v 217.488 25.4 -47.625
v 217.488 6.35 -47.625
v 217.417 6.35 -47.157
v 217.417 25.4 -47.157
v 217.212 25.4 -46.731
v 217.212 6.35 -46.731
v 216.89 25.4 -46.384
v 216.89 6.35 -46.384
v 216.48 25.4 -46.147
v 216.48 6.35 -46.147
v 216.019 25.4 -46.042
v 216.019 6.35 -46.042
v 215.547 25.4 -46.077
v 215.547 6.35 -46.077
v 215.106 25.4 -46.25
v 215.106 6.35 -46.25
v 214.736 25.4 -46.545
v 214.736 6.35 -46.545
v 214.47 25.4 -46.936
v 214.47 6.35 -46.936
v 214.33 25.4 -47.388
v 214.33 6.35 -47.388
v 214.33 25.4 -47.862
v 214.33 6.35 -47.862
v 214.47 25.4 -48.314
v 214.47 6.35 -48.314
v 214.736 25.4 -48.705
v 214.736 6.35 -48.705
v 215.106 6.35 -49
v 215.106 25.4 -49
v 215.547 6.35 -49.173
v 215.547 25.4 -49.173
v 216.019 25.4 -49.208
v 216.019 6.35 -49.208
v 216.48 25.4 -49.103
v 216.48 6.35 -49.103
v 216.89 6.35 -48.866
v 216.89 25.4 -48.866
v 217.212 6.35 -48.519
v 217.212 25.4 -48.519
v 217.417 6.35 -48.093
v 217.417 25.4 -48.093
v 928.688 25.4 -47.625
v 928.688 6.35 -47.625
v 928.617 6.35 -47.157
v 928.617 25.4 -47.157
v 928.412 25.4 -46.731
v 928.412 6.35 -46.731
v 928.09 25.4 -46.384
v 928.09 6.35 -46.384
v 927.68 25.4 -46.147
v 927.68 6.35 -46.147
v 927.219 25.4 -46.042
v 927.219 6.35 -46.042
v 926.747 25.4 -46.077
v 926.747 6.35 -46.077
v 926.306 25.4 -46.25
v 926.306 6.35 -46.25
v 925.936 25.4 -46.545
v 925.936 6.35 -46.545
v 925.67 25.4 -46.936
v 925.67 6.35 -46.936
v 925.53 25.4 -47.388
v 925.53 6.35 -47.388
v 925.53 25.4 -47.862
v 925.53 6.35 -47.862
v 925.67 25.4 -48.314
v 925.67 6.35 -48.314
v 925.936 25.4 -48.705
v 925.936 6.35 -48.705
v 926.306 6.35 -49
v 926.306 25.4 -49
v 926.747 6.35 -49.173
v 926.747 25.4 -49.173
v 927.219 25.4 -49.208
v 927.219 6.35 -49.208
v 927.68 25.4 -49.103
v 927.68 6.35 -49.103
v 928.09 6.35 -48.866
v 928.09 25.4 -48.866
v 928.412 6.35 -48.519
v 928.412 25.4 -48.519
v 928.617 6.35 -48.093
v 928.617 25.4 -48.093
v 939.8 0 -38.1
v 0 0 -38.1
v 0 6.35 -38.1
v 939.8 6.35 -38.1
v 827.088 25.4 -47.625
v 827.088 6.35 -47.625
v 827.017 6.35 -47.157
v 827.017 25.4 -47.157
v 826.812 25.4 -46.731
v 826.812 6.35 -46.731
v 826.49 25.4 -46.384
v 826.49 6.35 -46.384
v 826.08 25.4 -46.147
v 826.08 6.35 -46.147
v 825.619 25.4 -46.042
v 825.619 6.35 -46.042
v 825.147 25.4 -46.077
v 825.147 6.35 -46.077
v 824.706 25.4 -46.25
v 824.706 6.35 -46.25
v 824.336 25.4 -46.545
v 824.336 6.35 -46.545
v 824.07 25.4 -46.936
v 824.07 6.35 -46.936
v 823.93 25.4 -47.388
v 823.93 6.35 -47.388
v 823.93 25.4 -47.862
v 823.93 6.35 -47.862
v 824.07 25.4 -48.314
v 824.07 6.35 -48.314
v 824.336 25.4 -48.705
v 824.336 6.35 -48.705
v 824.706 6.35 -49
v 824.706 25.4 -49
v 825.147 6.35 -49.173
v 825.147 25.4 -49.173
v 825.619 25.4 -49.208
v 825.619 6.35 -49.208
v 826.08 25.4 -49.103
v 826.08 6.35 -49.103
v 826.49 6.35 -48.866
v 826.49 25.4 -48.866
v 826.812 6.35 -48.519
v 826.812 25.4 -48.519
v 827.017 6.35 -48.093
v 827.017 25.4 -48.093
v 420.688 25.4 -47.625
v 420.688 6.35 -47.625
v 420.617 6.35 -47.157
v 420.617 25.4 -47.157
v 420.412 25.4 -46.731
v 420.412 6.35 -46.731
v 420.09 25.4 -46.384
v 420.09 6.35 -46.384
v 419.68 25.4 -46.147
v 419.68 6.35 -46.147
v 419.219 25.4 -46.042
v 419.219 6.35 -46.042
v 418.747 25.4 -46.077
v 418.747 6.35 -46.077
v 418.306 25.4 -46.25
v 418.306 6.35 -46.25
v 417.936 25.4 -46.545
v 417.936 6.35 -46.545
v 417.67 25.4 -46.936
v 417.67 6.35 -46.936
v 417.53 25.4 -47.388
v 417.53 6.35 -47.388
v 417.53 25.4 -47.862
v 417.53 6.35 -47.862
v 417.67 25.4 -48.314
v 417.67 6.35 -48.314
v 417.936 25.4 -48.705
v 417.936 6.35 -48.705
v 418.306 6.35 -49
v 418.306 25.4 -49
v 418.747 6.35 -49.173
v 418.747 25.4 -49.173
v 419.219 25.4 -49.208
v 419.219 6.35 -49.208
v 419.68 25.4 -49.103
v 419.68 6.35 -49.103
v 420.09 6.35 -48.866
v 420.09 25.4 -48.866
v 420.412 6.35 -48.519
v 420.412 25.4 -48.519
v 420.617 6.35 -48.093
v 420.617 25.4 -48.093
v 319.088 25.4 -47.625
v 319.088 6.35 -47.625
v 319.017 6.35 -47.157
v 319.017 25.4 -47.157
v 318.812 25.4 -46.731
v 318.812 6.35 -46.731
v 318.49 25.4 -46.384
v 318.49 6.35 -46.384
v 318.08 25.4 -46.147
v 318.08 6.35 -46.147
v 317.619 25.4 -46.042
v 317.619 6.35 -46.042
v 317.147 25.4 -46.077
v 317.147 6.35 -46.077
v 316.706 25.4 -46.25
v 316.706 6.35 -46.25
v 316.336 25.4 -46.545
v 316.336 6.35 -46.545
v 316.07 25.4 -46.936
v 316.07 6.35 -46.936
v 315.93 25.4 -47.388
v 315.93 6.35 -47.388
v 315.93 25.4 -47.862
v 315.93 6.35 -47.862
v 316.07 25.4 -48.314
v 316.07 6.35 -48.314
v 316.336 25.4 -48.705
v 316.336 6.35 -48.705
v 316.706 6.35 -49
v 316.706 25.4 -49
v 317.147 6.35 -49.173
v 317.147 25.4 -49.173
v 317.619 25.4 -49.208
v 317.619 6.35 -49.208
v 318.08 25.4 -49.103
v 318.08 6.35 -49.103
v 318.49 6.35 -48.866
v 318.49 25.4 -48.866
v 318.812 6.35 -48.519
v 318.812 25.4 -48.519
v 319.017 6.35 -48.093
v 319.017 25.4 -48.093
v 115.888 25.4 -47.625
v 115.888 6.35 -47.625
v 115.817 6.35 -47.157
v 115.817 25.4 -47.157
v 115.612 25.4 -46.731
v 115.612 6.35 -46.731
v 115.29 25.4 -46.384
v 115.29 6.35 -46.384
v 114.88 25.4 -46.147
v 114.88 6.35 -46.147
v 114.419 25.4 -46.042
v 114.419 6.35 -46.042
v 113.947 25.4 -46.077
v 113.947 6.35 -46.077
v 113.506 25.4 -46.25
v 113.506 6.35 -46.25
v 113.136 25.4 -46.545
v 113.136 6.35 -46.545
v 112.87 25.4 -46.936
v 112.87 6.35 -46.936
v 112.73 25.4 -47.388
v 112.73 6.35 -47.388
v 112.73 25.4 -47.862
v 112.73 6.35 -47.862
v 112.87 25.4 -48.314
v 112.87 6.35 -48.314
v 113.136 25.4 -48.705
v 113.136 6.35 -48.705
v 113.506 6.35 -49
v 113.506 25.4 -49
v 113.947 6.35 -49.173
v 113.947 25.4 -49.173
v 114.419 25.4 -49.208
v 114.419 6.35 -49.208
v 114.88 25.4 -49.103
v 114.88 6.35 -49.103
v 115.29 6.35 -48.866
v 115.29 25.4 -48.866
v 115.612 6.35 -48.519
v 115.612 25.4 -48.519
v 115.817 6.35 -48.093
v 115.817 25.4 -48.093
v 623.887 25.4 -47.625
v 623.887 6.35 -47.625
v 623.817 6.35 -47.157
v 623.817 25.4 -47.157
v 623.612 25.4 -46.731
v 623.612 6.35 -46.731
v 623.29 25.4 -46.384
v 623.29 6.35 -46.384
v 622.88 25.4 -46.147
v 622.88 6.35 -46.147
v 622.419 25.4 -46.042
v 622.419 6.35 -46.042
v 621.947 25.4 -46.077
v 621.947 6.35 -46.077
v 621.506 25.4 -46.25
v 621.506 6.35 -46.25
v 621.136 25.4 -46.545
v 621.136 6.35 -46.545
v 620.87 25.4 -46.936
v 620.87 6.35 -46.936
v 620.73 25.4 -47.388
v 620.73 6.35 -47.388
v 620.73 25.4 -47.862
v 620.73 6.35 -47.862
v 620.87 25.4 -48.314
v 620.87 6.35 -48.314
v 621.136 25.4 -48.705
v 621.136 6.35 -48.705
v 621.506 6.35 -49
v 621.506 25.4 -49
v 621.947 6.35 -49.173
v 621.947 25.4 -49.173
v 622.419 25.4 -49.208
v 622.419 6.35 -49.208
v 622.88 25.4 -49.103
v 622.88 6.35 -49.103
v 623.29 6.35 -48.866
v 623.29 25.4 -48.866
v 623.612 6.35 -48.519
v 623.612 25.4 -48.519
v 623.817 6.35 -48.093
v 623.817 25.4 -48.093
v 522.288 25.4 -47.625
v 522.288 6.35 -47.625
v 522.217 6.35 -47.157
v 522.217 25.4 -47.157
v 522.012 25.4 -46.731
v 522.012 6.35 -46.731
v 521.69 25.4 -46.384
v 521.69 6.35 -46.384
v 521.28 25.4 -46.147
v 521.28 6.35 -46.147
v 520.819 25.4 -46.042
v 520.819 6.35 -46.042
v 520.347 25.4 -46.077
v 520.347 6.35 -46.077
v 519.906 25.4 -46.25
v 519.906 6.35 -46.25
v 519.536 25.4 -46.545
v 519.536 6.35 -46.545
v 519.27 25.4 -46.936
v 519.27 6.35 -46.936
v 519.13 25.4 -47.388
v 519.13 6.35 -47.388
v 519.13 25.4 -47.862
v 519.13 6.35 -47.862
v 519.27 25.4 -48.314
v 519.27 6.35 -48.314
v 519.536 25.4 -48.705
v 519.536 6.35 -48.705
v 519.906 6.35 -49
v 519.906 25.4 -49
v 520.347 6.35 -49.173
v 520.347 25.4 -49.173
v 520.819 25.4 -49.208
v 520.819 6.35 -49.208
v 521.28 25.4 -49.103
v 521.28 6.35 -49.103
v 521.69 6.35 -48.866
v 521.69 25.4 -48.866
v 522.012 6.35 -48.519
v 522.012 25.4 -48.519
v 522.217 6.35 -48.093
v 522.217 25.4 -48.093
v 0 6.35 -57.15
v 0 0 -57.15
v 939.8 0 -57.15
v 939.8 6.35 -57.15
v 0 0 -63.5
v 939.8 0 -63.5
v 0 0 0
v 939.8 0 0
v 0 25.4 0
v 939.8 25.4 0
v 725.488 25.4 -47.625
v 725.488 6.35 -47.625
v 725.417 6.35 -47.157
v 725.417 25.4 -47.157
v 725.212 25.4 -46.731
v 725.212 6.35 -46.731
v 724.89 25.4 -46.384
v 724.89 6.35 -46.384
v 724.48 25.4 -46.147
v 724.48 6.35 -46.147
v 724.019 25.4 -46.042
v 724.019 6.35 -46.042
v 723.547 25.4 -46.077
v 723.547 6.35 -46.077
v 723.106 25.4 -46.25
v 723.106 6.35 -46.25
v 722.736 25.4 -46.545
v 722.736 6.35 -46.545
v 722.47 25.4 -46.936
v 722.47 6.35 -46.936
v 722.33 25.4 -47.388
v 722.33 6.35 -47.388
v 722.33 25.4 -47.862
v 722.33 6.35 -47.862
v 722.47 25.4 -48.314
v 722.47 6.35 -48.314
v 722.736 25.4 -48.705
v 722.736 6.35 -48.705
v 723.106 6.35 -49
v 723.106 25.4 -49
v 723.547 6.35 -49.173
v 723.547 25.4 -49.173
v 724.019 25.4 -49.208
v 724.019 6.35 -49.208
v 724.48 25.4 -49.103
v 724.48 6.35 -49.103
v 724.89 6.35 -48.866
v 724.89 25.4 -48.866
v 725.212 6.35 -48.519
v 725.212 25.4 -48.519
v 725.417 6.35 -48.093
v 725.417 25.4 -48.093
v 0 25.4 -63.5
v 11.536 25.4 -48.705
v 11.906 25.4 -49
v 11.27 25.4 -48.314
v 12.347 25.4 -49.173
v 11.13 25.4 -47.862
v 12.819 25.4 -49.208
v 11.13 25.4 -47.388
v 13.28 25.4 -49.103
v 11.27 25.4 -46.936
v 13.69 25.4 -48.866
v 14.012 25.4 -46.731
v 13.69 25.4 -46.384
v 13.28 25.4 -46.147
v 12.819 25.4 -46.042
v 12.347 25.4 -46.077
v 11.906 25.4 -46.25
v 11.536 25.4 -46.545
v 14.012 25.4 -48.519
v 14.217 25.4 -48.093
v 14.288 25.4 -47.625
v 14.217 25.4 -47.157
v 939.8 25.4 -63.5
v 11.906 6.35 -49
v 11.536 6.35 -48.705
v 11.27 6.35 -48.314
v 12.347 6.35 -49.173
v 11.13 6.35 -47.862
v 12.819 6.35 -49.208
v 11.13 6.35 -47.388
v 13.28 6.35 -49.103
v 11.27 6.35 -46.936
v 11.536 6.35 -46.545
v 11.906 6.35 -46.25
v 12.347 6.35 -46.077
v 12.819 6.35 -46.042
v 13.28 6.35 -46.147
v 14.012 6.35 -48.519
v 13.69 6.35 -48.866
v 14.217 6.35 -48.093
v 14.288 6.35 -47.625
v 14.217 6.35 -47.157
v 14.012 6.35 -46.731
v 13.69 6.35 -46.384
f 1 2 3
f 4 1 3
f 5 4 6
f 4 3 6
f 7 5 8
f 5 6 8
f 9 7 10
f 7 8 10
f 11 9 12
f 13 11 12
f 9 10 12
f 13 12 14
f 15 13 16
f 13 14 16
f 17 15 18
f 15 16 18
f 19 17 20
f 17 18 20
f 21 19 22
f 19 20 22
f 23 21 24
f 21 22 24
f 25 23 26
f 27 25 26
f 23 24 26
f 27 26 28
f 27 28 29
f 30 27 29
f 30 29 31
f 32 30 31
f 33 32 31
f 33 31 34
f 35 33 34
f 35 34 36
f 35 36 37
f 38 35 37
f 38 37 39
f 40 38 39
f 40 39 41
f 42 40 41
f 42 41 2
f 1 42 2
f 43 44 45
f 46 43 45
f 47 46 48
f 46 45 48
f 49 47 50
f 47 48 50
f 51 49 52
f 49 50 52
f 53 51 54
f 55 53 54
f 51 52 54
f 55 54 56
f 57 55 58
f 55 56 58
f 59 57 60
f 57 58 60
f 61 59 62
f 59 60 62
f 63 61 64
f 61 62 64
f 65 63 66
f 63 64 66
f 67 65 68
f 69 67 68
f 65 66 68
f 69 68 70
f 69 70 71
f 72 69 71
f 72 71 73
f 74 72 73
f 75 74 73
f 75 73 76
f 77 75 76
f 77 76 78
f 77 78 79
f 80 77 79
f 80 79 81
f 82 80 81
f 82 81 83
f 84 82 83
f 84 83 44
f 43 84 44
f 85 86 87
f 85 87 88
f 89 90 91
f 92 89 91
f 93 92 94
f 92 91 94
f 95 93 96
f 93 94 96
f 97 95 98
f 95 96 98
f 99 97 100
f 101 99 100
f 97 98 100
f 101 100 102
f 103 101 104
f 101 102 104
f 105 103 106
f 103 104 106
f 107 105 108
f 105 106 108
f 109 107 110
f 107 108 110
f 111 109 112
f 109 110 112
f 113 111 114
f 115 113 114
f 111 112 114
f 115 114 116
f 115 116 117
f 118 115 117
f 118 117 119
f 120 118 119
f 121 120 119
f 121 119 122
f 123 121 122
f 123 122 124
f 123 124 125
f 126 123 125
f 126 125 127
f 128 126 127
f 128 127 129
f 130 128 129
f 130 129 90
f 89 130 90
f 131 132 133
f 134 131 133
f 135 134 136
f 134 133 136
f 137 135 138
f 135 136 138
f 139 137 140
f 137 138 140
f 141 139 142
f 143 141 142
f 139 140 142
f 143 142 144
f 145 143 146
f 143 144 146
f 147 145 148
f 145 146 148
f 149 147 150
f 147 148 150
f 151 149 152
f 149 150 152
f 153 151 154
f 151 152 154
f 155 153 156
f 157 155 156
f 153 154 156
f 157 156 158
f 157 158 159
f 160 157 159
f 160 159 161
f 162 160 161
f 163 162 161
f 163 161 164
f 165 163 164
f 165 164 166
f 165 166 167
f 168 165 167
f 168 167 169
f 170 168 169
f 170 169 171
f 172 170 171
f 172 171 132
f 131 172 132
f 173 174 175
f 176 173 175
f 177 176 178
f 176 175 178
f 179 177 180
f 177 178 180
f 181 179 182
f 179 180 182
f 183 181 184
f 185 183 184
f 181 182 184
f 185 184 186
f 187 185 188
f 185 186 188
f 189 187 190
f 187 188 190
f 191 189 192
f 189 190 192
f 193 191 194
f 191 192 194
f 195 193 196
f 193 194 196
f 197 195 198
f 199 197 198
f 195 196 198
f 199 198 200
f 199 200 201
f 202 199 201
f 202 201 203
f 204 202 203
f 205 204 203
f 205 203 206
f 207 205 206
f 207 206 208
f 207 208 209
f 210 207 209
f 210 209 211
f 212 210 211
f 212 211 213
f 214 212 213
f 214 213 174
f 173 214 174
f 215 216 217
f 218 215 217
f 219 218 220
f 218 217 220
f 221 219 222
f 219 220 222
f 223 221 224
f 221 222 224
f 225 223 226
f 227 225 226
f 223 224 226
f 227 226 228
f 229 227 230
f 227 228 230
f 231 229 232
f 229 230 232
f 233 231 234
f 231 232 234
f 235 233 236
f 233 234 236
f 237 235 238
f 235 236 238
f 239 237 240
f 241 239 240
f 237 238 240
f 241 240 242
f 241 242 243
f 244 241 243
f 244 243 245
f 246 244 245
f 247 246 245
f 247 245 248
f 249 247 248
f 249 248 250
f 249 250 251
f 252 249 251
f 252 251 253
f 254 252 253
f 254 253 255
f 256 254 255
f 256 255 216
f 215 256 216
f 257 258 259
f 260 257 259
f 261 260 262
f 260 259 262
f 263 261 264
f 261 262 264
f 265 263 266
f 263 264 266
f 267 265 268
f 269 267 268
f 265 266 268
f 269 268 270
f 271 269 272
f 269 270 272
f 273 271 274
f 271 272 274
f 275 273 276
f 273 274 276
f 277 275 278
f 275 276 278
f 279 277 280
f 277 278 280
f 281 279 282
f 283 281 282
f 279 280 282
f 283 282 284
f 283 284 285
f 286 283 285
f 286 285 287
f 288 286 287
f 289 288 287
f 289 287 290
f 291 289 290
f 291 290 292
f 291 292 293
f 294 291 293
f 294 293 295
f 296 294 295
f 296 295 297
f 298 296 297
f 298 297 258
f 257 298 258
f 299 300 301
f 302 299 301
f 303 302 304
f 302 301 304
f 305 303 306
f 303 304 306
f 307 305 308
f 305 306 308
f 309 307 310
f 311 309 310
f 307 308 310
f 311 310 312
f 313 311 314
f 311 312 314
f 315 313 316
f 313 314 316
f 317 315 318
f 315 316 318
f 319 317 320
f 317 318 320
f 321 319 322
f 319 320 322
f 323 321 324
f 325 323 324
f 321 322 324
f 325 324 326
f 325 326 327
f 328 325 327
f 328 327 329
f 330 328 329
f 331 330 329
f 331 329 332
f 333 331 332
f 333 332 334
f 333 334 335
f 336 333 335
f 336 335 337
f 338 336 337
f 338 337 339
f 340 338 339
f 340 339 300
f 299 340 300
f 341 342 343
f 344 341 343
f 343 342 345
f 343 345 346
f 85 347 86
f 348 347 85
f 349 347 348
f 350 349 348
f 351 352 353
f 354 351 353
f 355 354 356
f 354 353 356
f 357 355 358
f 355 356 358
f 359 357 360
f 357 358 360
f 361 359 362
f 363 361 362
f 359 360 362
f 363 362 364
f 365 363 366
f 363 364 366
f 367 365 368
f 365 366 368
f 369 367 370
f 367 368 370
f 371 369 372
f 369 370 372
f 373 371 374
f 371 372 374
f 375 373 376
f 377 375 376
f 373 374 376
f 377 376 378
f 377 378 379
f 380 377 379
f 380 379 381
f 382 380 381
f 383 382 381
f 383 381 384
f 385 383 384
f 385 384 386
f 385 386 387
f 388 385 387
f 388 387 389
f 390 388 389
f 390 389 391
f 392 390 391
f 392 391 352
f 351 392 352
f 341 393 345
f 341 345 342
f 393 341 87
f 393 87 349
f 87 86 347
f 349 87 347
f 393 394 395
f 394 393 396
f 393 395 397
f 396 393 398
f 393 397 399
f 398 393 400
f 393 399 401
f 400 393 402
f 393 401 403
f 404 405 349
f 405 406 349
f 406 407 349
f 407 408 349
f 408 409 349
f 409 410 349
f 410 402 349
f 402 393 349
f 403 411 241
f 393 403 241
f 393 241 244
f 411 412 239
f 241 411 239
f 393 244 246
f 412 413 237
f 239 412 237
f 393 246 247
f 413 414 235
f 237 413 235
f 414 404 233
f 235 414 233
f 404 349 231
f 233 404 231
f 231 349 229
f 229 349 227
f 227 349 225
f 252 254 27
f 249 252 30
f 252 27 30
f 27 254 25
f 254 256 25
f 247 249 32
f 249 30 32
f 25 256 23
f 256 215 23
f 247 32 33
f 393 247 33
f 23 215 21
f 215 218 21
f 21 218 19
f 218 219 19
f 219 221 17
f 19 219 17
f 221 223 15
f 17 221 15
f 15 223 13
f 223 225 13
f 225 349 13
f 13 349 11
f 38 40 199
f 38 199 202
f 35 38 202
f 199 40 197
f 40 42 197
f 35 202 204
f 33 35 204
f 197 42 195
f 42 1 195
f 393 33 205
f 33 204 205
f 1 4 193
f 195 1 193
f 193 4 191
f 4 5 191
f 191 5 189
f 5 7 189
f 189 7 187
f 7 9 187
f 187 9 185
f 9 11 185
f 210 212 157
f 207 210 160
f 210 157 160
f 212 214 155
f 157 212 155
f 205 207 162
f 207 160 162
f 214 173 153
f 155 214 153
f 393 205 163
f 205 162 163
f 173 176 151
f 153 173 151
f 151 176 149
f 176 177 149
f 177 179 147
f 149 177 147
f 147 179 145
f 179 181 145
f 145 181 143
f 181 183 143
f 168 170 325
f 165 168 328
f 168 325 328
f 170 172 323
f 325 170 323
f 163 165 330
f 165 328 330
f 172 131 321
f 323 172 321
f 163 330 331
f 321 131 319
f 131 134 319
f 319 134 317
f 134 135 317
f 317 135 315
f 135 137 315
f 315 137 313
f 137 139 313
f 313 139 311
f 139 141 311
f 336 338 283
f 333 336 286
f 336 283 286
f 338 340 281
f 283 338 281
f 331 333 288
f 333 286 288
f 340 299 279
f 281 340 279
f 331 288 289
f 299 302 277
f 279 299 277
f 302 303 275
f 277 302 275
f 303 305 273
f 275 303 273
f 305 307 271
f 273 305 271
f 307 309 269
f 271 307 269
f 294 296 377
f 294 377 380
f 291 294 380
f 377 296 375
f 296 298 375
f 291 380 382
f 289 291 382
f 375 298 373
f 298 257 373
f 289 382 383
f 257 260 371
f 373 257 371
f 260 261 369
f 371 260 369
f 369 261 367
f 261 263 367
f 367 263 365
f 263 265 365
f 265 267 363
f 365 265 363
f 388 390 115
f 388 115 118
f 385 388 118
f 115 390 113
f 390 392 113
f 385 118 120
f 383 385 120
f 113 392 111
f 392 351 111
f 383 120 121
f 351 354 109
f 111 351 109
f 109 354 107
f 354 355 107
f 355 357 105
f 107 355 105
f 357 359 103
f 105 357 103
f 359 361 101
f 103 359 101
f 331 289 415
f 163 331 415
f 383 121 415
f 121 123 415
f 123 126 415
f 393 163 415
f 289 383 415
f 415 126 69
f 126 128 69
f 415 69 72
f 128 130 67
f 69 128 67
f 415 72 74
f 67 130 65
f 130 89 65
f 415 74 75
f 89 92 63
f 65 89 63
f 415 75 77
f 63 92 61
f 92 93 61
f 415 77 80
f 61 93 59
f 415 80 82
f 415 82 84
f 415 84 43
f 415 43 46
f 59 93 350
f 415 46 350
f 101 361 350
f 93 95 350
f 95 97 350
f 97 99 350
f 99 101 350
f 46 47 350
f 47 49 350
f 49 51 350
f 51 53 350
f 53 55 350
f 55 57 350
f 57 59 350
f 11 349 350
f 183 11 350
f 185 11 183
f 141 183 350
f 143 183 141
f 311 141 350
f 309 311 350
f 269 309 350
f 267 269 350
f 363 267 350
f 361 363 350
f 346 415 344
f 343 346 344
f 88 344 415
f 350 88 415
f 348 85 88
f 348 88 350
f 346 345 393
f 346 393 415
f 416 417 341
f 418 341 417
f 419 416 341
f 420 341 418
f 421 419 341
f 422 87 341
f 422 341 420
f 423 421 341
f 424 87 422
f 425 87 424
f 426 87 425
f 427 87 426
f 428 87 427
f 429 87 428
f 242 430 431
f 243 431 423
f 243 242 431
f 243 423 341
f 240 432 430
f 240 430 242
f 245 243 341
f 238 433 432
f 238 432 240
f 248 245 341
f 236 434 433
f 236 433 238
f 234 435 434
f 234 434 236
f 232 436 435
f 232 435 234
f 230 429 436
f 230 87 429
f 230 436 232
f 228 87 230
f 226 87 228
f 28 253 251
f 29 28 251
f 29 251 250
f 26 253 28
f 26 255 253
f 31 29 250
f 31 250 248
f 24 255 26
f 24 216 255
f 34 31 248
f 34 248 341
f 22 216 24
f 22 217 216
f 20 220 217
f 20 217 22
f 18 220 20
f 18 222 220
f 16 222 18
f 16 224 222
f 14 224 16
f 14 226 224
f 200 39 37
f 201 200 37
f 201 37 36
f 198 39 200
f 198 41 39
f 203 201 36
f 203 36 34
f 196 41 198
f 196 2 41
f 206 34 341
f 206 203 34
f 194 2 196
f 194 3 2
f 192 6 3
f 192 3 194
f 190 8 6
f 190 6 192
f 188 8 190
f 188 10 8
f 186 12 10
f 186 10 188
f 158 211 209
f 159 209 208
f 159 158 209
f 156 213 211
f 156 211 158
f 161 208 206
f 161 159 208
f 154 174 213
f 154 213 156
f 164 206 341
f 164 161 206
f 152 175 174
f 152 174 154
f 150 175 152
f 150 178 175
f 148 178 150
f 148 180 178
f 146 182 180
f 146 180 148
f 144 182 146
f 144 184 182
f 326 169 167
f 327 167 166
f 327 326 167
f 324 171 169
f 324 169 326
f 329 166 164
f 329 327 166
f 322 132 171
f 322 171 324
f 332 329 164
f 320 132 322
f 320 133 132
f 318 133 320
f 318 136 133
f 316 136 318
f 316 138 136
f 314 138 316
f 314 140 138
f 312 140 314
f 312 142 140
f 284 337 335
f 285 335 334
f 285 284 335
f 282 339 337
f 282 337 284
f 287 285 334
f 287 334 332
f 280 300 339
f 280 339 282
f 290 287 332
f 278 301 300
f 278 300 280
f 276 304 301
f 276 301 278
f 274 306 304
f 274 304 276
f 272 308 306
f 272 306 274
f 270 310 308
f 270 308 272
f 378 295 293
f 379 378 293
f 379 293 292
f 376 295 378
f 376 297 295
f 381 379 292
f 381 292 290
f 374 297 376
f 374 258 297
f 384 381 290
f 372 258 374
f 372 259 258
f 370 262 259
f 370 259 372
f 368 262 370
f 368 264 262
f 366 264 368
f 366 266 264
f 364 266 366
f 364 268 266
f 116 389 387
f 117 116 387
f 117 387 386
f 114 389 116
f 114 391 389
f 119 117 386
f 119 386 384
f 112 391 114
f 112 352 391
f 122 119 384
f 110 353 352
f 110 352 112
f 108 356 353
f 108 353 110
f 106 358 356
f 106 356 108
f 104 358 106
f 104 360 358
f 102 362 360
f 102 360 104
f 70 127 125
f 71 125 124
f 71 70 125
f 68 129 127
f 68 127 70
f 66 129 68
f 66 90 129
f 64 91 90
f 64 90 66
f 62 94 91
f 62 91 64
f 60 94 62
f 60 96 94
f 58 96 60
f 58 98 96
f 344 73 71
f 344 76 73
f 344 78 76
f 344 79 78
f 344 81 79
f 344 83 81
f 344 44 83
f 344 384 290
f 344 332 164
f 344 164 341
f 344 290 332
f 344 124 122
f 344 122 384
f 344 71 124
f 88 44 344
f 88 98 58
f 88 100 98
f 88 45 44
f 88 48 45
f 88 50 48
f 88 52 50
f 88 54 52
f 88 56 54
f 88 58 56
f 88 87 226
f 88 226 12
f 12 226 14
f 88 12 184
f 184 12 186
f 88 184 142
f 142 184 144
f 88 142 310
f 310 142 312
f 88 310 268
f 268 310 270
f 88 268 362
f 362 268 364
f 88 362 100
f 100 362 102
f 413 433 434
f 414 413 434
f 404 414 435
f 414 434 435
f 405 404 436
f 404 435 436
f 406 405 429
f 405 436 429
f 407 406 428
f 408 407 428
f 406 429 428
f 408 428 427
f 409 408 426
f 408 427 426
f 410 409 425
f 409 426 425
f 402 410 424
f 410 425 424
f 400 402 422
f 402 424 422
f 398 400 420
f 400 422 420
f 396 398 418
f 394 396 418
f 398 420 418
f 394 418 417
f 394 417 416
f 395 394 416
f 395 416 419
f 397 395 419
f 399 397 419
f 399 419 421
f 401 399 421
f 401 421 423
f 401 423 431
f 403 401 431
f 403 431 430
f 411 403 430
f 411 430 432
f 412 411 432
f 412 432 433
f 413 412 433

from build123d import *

# Parameters (mm, degrees)
F0_W     = 939.8
F0_H     = 63.5
F1_DEPTH = 25.4
F2_W     = 939.8
F2_H     = 19.05
F3_DEPTH = 6.35
F4_R     = 1.5875
F5_DEPTH = 25.401


with BuildPart() as f1:
    # F0 (on Front) → F1 (new body)
    with BuildSketch(Plane.XZ):
        with Locations((469.9, -31.75)):
            Rectangle(F0_W, F0_H)
    extrude(amount=-F1_DEPTH)

    # F2 (on Front) → F3 (cut)
    with BuildSketch(Plane.XZ):
        with Locations((469.9, -47.625)):
            Rectangle(F2_W, F2_H)
    extrude(amount=-F3_DEPTH, mode=Mode.SUBTRACT)

    # F4 (on Front) → F5 (cut, through all)
    with BuildSketch(Plane.XZ):
        with Locations((12.7, -47.625)):
            Circle(F4_R)
        with Locations((114.3, -47.625)):
            Circle(F4_R)
        with Locations((215.9, -47.625)):
            Circle(F4_R)
        with Locations((317.5, -47.625)):
            Circle(F4_R)
        with Locations((419.1, -47.625)):
            Circle(F4_R)
        with Locations((520.7, -47.625)):
            Circle(F4_R)
        with Locations((622.3, -47.625)):
            Circle(F4_R)
        with Locations((723.9, -47.625)):
            Circle(F4_R)
        with Locations((825.5, -47.625)):
            Circle(F4_R)
        with Locations((927.1, -47.625)):
            Circle(F4_R)
    extrude(amount=-F5_DEPTH, mode=Mode.SUBTRACT)


solid = f1.part
